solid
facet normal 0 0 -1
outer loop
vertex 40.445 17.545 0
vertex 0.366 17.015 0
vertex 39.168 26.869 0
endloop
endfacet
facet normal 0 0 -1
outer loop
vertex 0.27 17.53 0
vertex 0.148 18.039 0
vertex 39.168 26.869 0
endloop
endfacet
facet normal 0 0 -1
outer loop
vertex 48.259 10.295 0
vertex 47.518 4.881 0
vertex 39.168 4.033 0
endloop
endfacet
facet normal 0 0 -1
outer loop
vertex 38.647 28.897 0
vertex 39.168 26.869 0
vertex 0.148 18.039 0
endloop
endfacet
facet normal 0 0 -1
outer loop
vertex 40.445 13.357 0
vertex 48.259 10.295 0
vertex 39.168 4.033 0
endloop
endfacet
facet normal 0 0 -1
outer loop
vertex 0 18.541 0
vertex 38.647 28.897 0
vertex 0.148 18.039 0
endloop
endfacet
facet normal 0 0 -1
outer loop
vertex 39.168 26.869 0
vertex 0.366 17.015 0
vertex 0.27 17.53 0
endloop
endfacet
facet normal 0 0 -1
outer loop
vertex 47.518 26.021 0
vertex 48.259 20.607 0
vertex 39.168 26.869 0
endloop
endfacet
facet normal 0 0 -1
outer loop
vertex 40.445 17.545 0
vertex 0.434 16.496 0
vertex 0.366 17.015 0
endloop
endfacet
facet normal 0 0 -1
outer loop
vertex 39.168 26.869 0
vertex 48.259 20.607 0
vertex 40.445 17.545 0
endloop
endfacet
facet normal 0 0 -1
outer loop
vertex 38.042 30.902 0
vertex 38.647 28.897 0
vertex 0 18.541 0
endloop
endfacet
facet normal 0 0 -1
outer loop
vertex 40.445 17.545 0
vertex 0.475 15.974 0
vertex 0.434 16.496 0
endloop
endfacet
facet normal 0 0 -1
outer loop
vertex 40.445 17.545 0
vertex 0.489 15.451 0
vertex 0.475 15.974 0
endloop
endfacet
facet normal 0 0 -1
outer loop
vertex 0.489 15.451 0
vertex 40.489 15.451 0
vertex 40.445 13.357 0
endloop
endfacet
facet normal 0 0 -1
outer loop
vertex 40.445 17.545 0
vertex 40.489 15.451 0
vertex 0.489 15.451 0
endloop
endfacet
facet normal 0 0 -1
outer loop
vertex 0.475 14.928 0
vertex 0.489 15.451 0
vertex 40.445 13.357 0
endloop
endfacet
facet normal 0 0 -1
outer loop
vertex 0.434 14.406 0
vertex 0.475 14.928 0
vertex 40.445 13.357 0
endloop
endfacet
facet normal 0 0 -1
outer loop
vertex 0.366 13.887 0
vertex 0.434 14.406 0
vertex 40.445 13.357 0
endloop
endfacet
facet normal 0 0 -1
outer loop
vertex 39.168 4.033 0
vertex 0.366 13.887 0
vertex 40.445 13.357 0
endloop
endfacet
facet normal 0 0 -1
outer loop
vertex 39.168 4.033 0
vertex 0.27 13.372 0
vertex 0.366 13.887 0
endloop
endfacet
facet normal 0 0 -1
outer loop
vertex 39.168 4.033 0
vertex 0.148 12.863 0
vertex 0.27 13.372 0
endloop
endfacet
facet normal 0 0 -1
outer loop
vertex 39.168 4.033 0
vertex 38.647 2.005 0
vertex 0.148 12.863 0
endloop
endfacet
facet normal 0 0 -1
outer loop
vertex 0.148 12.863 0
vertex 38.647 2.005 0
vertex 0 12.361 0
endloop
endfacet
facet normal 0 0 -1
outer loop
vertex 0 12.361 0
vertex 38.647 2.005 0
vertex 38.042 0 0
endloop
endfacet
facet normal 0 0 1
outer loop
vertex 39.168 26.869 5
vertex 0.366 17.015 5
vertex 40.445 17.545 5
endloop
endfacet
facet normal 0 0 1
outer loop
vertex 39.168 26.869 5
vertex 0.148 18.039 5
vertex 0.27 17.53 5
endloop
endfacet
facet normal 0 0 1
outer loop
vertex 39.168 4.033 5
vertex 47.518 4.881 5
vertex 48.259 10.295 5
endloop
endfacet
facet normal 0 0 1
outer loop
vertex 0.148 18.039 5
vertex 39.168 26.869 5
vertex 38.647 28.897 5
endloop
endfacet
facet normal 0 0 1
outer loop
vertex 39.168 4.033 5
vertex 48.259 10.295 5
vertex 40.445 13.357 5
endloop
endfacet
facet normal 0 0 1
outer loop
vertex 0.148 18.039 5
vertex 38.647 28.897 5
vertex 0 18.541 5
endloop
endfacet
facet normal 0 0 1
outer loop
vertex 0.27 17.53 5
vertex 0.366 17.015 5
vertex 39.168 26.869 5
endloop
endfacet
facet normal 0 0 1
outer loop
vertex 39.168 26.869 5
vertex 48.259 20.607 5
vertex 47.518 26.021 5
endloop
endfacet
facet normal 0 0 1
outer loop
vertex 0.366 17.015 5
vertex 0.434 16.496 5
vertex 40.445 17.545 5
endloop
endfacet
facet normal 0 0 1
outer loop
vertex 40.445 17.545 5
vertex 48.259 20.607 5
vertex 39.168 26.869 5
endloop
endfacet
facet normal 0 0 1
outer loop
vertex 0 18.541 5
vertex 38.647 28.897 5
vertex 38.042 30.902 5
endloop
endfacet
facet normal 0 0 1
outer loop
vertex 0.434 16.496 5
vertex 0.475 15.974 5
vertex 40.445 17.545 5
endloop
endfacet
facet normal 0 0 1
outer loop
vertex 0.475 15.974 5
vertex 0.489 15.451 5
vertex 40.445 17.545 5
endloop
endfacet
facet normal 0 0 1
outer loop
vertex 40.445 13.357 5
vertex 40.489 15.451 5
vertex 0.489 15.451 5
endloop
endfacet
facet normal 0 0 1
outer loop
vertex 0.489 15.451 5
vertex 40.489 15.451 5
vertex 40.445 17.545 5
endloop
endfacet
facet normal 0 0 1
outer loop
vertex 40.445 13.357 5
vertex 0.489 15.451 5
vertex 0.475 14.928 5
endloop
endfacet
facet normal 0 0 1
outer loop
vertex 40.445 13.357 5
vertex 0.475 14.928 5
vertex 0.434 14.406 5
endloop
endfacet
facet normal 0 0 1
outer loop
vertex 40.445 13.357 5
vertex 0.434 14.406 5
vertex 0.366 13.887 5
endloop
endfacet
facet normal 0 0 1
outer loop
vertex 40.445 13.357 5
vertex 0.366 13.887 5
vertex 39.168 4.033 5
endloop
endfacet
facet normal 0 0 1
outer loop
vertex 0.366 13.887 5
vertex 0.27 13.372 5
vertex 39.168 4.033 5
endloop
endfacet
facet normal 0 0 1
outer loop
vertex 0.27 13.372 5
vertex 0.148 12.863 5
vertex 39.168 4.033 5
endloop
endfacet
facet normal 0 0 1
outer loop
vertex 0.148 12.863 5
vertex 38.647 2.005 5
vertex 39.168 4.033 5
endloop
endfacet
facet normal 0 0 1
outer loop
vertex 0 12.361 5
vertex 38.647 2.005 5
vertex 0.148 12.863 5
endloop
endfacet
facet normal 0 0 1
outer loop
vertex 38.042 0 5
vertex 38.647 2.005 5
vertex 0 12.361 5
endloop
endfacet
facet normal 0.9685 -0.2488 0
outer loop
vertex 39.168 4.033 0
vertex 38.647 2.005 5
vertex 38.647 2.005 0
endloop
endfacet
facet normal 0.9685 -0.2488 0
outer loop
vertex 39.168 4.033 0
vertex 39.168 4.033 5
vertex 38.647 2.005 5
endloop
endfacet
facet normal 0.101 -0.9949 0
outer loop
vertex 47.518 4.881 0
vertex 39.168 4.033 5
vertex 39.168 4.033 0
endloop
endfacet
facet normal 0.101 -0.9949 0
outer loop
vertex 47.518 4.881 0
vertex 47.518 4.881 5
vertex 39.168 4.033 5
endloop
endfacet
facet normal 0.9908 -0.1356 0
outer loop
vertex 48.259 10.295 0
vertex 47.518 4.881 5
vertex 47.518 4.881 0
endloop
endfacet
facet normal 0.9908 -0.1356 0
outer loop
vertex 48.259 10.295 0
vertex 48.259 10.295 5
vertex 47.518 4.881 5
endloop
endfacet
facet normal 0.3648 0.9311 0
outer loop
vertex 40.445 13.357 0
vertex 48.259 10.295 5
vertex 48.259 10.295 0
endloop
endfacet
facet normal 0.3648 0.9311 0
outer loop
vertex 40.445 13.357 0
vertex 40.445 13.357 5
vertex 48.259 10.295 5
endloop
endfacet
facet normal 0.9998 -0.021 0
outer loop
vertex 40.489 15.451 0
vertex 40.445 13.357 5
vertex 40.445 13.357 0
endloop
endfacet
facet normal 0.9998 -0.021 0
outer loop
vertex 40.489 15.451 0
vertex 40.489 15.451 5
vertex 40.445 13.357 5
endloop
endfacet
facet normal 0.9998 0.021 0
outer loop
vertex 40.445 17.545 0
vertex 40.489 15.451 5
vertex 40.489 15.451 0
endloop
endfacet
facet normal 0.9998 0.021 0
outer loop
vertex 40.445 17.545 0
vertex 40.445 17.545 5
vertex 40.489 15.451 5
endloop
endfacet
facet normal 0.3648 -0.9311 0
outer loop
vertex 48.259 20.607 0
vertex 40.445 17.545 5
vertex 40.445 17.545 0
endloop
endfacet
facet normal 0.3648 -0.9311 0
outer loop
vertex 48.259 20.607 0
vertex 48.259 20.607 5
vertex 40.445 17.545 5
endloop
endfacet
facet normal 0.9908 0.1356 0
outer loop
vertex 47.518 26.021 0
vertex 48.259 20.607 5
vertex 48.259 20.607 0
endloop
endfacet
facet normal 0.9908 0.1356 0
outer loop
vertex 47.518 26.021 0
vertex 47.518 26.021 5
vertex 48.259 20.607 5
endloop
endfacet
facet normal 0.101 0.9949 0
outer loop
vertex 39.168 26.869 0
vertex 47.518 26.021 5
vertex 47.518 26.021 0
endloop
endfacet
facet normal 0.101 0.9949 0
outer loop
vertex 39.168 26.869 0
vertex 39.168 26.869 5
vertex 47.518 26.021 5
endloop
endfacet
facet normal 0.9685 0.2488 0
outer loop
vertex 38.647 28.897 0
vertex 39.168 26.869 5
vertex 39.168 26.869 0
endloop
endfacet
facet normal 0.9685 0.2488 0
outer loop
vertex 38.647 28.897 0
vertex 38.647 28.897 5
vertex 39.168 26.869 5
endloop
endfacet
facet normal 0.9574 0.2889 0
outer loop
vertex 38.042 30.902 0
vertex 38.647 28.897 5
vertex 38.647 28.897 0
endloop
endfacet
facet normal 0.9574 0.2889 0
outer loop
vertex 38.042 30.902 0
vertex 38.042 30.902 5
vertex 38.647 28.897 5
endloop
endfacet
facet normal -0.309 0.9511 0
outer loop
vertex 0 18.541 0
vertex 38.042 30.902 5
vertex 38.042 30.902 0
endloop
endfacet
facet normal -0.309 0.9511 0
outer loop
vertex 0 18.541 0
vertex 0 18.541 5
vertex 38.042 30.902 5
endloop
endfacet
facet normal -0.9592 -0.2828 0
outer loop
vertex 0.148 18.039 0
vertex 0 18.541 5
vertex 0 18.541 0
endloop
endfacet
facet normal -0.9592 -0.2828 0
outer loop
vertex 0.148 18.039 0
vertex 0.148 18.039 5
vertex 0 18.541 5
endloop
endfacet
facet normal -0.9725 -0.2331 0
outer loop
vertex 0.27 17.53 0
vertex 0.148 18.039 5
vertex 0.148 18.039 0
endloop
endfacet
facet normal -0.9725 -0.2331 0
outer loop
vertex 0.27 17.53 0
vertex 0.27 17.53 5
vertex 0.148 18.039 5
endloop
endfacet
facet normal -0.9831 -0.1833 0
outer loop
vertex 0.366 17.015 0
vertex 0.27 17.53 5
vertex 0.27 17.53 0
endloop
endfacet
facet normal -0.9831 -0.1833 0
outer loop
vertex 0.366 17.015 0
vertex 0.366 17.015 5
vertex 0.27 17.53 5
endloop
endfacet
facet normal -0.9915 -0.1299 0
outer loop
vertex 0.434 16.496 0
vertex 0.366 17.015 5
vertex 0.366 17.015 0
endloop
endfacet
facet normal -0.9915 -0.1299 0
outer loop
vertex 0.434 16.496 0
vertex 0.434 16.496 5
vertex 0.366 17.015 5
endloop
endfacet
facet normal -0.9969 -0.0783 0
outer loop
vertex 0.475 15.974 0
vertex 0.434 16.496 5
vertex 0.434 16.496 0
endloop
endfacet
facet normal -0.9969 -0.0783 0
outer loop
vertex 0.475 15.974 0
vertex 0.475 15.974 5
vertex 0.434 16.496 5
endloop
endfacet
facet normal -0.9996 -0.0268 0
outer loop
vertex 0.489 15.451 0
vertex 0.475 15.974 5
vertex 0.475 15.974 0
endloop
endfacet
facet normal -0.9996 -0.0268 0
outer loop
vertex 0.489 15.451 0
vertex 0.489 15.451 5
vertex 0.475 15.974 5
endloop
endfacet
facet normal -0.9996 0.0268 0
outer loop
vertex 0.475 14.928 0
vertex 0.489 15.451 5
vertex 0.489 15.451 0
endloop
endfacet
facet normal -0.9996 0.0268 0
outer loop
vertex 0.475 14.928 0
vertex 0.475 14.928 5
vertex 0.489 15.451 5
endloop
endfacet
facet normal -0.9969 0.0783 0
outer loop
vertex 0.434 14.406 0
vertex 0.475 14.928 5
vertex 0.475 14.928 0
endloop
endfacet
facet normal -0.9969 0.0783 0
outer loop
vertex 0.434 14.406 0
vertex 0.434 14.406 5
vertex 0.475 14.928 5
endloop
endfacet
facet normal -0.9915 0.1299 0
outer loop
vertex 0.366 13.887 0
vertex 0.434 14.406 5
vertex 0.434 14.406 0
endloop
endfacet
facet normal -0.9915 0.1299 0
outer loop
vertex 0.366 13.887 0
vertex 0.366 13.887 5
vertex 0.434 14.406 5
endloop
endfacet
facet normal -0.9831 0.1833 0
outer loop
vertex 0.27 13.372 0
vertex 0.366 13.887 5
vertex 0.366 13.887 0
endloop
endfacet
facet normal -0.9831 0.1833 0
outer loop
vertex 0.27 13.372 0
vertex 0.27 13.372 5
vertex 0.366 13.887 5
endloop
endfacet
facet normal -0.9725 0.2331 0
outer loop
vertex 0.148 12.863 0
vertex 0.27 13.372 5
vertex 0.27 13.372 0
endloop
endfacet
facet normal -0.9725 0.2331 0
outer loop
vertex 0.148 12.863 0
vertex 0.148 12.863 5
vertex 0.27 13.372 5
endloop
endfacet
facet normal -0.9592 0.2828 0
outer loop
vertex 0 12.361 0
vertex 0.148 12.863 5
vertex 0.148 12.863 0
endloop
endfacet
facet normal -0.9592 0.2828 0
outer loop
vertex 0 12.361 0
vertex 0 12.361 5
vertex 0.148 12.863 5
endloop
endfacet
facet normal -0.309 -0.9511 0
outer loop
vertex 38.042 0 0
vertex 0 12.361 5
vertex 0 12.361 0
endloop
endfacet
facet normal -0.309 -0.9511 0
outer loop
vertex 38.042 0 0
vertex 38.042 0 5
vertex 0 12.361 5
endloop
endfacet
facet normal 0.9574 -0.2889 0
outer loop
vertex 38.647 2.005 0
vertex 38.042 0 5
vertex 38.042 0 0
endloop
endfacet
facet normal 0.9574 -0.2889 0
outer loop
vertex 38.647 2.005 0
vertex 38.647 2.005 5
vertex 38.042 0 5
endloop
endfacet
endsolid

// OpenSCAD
$fn = 32;

// ----------------------------------------------------------------------
// Gear sector: 2 teeth on 36 degrees
// ----------------------------------------------------------------------

// --- parameters (mm) ---
sector_angle = 36;        // sector angle, degrees
root_r = 50;              // root circle radius
tooth_h = 8;              // tooth height over the root circle
teeth = 2;                // number of teeth on the sector
hub_r = 10;               // hub bore radius
plate_t = 5;              // sector thickness, Z
arc_step = 3;             // sampling step of the root/hub arcs, degrees

tip_r = root_r + tooth_h;  // tip circle radius

profile = [[38.042, 0], [38.647, 2.005], [39.168, 4.033], [47.518, 4.881], [48.259, 10.295], [40.445, 13.357], [40.489, 15.451], [40.445, 17.545], [48.259, 20.607], [47.518, 26.021], [39.168, 26.869], [38.647, 28.897], [38.042, 30.902], [0, 18.541], [0.148, 18.039], [0.27, 17.53], [0.366, 17.015], [0.434, 16.496], [0.475, 15.974], [0.489, 15.451], [0.475, 14.928], [0.434, 14.406], [0.366, 13.887], [0.27, 13.372], [0.148, 12.863], [0, 12.361]];  // primary outline, 26 points, counter clockwise

// --- the one profile operation ---
linear_extrude(height = plate_t) polygon(points = profile);
